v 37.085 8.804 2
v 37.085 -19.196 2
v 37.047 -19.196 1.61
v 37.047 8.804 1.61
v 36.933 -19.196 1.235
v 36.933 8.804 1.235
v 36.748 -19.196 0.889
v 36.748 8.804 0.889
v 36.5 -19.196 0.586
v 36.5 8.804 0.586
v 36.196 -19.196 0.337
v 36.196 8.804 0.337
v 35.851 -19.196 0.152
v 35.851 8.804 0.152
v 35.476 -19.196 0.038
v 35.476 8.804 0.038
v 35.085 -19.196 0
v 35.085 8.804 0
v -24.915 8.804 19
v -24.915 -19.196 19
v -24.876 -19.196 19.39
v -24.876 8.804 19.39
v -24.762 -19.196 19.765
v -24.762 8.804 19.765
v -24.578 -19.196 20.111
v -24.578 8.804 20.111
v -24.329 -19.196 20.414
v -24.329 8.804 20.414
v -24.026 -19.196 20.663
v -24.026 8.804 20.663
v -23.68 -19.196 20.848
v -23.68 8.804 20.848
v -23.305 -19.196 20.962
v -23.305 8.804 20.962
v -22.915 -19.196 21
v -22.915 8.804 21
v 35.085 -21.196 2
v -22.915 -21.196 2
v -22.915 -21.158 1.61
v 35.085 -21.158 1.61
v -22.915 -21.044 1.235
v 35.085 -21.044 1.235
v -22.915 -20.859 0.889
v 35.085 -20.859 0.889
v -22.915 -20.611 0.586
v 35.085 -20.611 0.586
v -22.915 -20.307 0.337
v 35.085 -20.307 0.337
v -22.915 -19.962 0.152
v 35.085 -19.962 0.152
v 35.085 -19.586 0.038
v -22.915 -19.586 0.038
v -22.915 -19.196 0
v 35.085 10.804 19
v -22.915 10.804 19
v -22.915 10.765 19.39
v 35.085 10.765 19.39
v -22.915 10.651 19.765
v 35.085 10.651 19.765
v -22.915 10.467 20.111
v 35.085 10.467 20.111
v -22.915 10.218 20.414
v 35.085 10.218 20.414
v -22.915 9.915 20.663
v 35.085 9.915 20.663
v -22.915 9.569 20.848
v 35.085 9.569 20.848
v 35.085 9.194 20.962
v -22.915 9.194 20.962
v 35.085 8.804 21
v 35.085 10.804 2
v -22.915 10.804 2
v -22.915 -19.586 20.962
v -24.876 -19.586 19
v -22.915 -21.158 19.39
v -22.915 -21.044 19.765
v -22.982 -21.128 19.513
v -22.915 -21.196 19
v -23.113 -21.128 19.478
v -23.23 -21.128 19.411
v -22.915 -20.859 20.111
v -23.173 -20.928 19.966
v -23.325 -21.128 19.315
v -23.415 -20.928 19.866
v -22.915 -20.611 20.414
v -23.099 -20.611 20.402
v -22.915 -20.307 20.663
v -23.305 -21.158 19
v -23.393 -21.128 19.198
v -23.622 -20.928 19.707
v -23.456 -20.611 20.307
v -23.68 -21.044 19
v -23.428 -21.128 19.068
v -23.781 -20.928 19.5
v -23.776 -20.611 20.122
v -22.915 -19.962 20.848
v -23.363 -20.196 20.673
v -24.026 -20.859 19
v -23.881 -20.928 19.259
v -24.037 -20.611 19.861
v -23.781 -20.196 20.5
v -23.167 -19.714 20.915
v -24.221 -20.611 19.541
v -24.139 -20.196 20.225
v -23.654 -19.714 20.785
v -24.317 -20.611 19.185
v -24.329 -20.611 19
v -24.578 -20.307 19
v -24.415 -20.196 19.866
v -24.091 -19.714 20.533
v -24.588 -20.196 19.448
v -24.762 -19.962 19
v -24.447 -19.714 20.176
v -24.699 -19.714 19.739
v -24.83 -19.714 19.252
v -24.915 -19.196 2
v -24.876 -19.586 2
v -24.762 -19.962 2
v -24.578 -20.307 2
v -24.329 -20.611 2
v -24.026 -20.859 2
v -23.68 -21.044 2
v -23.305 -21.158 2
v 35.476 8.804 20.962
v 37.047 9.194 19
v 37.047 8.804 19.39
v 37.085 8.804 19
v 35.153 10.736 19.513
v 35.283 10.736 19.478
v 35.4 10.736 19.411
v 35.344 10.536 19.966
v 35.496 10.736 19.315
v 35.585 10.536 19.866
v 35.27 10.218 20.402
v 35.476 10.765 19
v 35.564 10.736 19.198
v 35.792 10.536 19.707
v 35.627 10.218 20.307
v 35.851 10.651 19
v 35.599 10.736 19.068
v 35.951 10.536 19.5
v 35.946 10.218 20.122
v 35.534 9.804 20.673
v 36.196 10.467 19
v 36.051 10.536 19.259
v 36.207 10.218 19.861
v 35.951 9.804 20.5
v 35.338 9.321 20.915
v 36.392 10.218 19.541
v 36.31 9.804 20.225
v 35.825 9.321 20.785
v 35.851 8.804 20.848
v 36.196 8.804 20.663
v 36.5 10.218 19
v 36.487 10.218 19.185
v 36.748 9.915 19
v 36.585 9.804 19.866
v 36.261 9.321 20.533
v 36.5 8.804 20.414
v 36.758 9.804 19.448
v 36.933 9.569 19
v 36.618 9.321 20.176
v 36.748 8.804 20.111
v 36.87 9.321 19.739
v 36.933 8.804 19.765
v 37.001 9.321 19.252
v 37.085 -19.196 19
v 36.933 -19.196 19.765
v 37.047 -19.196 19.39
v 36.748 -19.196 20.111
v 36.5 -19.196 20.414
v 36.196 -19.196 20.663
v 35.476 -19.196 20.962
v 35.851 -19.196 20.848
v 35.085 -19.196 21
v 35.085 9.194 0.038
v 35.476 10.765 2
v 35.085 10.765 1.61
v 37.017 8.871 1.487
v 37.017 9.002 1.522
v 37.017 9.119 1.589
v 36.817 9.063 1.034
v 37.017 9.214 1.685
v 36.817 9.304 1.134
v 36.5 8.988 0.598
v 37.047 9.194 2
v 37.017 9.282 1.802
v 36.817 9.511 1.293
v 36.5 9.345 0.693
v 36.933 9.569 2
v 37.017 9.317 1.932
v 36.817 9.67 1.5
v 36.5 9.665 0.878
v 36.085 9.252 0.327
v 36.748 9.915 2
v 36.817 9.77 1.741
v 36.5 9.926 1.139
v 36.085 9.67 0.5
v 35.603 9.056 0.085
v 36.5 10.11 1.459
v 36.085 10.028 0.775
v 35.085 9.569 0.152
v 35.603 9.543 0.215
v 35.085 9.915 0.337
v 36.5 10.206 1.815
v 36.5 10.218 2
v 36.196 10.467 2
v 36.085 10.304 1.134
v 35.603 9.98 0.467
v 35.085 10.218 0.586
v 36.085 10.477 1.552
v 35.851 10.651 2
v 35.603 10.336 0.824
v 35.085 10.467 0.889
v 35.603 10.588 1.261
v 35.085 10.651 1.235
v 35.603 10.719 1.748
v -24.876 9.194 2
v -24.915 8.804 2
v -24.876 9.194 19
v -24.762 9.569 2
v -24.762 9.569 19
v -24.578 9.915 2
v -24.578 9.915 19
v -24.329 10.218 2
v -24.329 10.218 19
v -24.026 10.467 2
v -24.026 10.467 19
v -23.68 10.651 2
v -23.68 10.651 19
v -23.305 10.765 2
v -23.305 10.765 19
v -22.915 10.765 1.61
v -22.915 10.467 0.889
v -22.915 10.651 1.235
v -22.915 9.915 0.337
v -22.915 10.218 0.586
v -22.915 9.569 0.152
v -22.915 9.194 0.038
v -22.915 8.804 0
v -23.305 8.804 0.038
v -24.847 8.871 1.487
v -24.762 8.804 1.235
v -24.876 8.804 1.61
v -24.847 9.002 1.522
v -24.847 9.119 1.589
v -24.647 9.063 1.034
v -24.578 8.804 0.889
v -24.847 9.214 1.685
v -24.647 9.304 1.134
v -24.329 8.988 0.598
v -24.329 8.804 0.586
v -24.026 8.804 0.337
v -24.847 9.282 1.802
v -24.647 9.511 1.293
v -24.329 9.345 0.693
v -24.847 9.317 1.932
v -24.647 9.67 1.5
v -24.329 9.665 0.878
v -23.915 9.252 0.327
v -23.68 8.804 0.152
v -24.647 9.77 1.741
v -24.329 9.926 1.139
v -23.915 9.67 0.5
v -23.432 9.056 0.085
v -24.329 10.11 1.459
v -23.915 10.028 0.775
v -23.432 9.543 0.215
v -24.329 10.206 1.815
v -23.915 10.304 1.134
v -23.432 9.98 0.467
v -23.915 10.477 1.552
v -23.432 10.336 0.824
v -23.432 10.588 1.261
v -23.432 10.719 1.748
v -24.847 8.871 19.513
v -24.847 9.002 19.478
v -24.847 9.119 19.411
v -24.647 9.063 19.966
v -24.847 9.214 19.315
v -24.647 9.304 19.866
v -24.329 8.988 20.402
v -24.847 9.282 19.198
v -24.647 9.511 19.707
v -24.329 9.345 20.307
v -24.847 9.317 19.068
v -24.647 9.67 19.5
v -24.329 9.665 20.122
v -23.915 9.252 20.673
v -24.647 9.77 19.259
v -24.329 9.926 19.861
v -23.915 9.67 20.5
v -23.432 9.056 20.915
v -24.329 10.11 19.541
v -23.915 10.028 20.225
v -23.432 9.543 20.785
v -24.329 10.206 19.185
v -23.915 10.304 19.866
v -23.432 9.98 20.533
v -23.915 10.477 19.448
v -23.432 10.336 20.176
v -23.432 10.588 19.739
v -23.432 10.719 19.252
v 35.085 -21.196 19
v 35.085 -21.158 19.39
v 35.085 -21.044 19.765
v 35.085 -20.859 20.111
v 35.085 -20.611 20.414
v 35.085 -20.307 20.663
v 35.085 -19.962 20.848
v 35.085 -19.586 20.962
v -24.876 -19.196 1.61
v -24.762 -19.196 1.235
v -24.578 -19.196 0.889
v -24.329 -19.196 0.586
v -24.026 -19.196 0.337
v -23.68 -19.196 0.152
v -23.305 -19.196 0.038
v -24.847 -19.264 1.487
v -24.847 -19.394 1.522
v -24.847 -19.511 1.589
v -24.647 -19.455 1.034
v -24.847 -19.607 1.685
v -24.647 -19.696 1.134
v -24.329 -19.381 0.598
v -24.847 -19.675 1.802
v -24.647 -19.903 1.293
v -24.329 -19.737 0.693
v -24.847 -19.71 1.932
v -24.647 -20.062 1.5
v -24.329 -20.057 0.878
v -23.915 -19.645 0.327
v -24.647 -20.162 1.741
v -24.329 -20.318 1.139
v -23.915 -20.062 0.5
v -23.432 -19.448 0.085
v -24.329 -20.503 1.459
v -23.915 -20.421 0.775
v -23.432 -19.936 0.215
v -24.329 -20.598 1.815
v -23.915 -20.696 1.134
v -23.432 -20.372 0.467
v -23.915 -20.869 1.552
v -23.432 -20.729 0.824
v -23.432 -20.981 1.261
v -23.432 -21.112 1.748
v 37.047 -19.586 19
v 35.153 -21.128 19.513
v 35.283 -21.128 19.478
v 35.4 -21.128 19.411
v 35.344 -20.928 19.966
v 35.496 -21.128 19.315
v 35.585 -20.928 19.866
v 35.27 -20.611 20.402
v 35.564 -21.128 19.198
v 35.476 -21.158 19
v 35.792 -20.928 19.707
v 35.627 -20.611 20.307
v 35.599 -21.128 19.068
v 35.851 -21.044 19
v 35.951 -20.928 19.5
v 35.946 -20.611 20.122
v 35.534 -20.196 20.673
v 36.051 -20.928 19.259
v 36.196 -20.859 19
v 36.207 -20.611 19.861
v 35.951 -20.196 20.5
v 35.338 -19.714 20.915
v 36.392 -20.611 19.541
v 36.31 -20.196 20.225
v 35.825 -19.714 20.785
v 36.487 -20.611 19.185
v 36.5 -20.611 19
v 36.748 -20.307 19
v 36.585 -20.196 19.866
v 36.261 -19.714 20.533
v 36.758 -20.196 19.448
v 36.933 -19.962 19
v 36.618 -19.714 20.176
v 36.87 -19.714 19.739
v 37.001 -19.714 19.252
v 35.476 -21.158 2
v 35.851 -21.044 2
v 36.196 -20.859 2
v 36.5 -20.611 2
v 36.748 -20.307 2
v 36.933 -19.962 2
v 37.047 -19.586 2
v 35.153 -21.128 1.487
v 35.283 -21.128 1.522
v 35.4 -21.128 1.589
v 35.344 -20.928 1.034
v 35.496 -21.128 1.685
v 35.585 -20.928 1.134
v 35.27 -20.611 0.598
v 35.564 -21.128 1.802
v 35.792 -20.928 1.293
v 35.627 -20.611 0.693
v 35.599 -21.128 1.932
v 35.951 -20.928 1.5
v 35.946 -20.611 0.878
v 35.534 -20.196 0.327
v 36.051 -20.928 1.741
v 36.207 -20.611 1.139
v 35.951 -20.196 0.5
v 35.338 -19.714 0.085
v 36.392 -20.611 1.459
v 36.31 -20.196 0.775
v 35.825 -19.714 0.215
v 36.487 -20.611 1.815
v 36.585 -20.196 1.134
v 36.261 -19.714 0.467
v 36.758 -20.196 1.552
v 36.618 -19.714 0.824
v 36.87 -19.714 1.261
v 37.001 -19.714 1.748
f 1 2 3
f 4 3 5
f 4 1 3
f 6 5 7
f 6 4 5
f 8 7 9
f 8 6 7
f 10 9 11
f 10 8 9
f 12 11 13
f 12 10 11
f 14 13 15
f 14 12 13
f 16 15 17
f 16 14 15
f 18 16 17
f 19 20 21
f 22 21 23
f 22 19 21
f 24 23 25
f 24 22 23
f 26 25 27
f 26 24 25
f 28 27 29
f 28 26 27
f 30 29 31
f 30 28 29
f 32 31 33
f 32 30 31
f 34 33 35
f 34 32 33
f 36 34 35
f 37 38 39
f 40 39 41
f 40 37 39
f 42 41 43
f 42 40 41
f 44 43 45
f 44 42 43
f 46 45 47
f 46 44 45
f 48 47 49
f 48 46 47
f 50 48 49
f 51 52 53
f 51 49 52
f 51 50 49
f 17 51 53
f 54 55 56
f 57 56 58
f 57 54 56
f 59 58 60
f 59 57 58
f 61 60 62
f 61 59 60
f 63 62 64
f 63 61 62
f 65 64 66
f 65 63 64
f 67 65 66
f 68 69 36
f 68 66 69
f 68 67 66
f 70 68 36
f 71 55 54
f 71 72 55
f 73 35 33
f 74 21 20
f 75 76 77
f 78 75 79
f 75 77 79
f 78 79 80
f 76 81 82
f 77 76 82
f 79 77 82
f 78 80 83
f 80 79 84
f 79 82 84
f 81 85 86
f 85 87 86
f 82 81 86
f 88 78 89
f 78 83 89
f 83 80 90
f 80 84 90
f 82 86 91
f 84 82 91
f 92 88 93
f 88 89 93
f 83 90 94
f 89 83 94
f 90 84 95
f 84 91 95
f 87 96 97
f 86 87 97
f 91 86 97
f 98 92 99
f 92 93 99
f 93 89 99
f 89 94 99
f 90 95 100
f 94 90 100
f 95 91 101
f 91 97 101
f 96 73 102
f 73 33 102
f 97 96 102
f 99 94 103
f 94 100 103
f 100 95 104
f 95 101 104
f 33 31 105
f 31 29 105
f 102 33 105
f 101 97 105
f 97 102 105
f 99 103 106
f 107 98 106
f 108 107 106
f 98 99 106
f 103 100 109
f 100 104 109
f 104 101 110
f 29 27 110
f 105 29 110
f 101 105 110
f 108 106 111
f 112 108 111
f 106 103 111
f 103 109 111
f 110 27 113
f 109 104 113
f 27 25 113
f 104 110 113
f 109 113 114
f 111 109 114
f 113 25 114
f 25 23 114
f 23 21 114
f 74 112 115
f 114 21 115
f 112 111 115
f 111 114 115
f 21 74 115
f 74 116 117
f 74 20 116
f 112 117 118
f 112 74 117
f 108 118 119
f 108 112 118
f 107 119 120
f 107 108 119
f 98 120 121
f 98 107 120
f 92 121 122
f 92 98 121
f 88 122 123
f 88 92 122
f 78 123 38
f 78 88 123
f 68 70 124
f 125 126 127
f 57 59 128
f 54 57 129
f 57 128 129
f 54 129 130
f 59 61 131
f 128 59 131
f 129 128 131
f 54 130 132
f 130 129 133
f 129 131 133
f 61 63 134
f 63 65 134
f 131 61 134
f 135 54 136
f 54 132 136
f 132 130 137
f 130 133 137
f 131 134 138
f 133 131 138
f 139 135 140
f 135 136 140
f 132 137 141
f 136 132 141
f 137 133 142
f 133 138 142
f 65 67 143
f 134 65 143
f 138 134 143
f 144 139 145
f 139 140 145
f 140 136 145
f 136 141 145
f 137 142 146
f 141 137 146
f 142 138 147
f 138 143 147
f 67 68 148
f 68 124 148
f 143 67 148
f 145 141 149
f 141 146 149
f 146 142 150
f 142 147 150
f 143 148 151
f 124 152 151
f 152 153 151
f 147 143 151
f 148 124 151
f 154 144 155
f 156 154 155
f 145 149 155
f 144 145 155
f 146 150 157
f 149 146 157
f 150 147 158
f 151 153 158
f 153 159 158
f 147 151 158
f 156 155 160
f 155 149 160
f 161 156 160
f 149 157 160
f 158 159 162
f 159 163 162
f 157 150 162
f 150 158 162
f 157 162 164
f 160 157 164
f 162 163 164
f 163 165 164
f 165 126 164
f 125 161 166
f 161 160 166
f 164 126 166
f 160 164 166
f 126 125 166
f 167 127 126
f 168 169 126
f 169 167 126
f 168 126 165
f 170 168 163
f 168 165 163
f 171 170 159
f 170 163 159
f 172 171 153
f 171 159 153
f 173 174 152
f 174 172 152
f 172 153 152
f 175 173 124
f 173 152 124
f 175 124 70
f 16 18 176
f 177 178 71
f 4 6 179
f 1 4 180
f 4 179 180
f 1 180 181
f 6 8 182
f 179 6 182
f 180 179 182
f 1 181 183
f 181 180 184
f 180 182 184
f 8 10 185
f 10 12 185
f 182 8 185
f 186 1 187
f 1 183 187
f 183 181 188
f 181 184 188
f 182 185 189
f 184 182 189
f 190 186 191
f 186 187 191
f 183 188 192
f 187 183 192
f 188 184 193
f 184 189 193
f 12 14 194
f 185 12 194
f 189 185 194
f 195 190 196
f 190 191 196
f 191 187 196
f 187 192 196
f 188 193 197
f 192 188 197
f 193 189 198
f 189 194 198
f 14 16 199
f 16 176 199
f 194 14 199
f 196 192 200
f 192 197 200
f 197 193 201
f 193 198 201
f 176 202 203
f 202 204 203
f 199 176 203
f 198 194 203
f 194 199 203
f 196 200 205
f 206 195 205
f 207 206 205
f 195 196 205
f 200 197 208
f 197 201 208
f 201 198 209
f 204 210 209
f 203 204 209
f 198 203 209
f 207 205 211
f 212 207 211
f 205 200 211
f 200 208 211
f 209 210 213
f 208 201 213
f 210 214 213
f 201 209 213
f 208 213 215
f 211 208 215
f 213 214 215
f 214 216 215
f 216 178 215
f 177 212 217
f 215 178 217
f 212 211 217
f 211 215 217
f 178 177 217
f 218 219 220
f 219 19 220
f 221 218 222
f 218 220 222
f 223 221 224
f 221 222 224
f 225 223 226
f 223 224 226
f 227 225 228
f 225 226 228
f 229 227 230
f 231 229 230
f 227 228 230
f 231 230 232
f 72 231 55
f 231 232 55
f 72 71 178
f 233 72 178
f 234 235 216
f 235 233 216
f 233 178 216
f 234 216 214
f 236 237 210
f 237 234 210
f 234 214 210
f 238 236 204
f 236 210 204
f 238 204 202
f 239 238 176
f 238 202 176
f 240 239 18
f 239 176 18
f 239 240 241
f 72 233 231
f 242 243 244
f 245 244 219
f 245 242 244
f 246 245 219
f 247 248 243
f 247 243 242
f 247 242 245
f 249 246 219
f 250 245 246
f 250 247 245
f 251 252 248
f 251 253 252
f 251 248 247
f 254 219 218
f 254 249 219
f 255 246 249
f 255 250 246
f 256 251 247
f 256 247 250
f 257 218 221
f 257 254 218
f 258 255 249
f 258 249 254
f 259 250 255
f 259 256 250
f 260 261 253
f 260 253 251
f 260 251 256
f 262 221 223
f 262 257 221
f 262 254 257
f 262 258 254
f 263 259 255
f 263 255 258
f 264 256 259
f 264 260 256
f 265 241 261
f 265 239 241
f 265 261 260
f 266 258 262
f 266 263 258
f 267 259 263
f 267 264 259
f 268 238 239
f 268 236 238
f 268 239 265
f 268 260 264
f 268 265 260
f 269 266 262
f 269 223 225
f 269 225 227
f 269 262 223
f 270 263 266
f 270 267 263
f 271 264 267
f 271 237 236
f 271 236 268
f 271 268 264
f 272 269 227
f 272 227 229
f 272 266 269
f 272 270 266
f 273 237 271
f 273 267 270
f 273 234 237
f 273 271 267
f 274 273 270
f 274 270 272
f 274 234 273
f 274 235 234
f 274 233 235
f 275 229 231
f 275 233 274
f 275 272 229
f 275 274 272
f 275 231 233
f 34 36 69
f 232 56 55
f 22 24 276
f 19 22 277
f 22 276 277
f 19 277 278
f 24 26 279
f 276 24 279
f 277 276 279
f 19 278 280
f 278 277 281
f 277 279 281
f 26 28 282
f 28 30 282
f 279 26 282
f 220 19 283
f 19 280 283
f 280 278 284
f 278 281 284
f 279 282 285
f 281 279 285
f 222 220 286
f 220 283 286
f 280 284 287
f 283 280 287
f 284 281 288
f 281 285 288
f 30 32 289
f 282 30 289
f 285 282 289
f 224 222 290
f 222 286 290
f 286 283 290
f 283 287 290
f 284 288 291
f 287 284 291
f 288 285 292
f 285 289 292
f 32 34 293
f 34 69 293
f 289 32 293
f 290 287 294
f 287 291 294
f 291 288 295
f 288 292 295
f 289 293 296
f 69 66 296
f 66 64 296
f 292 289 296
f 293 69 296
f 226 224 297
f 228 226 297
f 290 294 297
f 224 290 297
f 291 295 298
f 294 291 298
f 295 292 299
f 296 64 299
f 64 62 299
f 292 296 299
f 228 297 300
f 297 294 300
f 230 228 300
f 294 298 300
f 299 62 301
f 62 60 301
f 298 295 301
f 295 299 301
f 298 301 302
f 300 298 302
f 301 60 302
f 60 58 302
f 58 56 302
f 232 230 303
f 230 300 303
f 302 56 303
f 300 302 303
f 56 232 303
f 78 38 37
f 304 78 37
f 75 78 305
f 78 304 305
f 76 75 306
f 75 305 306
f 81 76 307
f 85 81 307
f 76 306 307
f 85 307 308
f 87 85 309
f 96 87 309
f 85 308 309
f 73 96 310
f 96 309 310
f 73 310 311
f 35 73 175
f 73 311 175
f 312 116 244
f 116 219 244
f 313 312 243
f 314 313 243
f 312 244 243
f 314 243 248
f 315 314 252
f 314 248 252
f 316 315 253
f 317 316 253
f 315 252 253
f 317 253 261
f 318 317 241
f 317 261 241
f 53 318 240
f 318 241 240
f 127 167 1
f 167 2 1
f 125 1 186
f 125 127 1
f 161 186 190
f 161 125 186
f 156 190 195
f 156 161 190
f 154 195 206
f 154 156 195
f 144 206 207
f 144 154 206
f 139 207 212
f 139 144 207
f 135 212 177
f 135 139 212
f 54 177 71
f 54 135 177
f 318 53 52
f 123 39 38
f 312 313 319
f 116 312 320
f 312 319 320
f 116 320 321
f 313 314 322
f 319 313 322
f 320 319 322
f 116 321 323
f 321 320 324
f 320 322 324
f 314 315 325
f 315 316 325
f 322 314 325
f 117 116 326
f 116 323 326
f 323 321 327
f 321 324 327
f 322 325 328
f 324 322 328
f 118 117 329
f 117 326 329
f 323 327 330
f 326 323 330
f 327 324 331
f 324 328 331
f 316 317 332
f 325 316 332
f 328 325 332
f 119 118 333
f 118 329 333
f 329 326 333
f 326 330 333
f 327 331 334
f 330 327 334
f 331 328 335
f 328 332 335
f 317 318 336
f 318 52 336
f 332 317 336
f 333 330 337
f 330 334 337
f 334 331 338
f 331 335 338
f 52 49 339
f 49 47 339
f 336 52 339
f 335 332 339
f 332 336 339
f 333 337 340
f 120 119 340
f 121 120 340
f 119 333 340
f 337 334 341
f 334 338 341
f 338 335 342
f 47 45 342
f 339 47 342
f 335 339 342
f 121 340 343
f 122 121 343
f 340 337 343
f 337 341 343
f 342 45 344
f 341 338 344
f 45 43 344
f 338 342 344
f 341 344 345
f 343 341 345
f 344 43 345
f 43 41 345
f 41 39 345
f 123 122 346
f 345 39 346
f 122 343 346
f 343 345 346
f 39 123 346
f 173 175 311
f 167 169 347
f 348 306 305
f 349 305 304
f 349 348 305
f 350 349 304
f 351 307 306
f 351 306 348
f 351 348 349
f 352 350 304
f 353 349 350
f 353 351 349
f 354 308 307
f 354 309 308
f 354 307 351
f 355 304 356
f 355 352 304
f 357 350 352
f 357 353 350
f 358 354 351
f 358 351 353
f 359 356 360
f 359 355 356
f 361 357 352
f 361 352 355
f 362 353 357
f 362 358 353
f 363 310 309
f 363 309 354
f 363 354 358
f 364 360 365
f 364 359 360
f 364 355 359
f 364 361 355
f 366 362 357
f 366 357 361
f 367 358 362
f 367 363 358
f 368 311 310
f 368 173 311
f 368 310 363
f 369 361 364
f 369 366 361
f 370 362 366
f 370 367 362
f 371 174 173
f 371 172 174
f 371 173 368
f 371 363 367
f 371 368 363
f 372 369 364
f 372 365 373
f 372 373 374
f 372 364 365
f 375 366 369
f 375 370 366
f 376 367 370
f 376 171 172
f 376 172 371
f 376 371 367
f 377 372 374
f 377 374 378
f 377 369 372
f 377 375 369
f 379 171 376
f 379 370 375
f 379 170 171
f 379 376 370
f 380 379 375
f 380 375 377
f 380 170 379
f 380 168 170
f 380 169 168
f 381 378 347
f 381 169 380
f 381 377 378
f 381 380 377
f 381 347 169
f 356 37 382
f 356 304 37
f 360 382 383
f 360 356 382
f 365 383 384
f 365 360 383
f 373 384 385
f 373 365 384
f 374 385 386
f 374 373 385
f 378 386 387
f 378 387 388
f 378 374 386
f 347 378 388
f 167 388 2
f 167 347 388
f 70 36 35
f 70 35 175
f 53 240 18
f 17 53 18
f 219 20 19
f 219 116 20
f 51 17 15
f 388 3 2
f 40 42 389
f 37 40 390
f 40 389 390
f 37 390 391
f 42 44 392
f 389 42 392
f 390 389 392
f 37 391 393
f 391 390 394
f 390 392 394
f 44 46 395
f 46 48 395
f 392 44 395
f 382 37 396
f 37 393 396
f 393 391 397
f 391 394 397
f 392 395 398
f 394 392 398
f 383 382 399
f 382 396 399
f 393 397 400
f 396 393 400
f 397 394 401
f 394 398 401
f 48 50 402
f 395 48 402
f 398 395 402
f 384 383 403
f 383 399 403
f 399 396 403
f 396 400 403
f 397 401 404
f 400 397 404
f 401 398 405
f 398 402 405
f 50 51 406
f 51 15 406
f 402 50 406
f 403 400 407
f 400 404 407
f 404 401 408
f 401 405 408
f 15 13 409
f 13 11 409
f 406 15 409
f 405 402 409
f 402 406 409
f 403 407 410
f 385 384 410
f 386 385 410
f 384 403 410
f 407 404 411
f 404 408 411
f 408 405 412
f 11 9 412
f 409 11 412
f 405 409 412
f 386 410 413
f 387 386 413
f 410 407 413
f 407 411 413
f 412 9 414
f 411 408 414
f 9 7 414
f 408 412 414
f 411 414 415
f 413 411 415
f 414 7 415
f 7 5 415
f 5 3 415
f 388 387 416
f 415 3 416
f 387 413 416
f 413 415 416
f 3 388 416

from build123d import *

# Parameters (mm, degrees)
ESBO_O1_W                = 62
ESBO_O1_H                = 32
RESSALTO_EXTRUS_O1_DEPTH = 21
FILETE1_R                = 2


with BuildPart() as part:
    # Esboço1 → Ressalto-extrusão1 (new body)
    with BuildSketch(Plane.XY):
        with Locations((6.085348506, -5.196301565)):
            Rectangle(ESBO_O1_W, ESBO_O1_H)
    extrude(amount=RESSALTO_EXTRUS_O1_DEPTH)

    # Filete1
    filete1_edges = [part.edges().sort_by_distance(p)[0] for p in [
        (37.085348506, -5.196301565, 21),
        (6.085348506, 10.803698435, 21),
        (-24.914651494, -5.196301565, 21),
        (6.085348506, 10.803698435, 0),
        (37.085348506, -5.196301565, 0),
        (6.085348506, -21.196301565, 0),
        (-24.914651494, -5.196301565, 0),
        (6.085348506, -21.196301565, 21),
        (-24.914651494, 10.803698435, 10.5),
        (37.085348506, 10.803698435, 10.5),
        (37.085348506, -21.196301565, 10.5),
        (-24.914651494, -21.196301565, 10.5),
    ]]
    fillet(filete1_edges, radius=FILETE1_R)


solid = part.part
